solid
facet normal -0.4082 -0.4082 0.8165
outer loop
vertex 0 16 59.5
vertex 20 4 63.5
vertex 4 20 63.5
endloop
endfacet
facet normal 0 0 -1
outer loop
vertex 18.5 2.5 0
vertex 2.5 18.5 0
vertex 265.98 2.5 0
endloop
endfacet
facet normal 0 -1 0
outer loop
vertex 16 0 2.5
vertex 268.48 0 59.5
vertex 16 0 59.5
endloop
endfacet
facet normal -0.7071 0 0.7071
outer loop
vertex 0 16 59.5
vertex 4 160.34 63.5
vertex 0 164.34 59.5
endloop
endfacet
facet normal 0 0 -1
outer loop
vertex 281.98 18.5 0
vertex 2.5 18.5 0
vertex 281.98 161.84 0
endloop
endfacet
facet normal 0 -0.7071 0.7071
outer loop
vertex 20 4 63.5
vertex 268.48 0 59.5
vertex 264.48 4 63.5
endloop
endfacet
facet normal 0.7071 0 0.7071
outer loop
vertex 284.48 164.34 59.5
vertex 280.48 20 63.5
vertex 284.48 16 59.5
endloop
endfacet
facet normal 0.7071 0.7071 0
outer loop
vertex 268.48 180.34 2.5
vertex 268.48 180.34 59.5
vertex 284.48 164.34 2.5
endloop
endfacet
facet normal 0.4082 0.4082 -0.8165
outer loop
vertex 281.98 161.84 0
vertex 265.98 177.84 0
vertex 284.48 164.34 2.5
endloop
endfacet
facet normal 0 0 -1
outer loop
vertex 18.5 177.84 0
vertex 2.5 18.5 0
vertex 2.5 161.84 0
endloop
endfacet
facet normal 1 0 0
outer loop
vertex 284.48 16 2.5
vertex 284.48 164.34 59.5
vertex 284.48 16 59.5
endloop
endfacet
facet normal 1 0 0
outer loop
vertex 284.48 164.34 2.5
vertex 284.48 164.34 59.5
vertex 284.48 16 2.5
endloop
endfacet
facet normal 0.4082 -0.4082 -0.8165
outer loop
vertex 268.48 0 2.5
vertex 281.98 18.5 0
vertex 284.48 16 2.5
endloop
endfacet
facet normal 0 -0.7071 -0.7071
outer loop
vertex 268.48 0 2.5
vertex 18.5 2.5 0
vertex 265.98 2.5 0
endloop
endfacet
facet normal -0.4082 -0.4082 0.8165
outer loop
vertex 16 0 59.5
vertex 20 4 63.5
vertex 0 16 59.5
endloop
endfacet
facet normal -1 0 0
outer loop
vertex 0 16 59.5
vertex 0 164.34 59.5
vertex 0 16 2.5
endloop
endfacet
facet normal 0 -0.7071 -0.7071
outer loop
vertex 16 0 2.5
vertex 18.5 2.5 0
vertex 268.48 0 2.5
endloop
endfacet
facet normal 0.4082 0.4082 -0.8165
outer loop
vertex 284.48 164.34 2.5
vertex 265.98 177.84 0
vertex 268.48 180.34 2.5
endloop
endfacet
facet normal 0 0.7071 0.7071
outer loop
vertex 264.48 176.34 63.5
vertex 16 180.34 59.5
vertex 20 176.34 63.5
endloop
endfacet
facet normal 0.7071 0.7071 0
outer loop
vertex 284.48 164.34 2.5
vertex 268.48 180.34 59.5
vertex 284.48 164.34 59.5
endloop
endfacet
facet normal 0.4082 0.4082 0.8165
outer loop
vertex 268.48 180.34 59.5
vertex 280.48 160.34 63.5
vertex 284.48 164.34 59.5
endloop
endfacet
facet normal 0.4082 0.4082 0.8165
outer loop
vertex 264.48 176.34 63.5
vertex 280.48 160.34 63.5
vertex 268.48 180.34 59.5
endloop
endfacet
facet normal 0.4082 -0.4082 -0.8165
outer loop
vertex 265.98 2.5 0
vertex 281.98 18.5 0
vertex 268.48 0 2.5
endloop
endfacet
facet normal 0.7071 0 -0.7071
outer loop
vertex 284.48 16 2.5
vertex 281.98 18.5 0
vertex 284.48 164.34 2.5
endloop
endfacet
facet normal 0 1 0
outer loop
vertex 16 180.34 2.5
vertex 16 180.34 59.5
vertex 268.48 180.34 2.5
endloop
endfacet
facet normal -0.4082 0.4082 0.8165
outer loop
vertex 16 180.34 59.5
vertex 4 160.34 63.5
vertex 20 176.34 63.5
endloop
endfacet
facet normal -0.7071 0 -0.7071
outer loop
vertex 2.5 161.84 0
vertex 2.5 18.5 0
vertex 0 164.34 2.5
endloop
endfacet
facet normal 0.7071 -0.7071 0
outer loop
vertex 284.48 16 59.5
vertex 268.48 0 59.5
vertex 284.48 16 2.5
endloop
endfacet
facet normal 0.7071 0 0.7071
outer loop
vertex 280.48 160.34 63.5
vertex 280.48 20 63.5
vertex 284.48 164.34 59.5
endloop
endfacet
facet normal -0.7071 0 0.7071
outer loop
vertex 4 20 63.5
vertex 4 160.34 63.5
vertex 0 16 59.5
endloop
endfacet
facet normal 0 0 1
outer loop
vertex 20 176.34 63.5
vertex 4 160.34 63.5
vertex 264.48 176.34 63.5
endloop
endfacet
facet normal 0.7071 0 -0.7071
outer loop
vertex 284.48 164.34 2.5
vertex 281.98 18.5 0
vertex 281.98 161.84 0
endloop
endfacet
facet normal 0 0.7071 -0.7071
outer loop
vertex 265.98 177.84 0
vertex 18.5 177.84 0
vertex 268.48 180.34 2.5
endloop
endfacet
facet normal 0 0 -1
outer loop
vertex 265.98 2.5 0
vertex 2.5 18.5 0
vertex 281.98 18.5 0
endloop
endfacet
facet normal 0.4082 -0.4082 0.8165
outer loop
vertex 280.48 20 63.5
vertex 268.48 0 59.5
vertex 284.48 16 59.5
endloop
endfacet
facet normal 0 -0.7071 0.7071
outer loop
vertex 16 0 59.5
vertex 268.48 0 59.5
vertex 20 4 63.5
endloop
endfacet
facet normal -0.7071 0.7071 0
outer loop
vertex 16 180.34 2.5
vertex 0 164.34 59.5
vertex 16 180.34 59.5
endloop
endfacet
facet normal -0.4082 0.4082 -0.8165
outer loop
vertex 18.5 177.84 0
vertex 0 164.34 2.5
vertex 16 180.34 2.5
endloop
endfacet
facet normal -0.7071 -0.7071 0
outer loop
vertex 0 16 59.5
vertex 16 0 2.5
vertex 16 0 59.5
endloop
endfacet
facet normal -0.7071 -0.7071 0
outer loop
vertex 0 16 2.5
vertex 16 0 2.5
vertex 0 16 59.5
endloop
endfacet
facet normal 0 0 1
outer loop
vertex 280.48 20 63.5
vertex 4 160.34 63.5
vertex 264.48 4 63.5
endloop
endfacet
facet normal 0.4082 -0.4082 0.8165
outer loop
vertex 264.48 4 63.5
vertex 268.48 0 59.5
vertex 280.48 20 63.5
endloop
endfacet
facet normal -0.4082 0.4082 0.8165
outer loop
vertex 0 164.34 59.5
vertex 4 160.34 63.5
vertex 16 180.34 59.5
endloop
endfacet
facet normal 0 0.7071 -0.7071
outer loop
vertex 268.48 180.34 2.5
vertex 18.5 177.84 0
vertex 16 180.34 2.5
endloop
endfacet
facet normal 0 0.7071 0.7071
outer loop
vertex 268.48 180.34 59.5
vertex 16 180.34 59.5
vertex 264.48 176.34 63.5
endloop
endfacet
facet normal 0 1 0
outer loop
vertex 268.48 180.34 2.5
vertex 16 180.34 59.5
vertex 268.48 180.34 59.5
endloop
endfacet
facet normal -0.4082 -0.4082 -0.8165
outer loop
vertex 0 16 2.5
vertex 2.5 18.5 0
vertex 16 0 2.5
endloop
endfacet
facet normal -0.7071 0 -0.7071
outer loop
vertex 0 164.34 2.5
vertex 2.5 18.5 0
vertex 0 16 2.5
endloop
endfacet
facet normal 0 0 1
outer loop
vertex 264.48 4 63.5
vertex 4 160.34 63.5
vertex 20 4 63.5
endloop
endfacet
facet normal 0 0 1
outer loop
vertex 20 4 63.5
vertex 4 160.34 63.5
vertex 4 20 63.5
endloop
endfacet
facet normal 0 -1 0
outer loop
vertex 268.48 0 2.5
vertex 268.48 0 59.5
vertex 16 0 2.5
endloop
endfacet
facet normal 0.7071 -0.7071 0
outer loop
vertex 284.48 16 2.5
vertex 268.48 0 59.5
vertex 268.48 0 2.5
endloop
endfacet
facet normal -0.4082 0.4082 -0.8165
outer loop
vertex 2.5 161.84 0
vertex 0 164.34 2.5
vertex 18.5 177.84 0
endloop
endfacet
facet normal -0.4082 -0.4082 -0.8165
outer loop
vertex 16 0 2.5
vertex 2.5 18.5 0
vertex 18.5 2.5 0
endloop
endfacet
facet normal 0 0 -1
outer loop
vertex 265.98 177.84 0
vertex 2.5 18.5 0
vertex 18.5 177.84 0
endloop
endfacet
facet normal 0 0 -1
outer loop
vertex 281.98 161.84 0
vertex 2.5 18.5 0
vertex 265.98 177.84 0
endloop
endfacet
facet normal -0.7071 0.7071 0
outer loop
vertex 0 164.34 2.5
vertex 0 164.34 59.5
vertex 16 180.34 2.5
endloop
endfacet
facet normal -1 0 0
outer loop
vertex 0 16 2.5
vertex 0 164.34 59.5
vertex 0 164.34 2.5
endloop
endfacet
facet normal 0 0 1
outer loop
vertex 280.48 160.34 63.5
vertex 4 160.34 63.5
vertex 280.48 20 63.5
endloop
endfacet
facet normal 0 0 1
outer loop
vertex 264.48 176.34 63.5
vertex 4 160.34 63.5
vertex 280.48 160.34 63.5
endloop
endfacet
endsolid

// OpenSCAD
// ZACOS slab case — Tonverk-class, chamfered
// 11.2 x 7.1 x 2.5 in as given. All units mm. Edit the numbers; the shape follows.
// hollow=true gives an open-bottom printable shell for mockups.

L  = 11.2 * 25.4;   // length   284.48
W  = 7.1  * 25.4;   // width    180.34
H  = 2.5  * 25.4;   // height    63.50
CC = 16;            // plan corner chamfer — the brand shape
TB = 4;             // top edge bevel
BB = 2.5;           // bottom edge bevel

hollow = false;     // true -> shell with open bottom
wall   = 3;         // shell wall thickness when hollow

module plan(inset=0, cc=CC)
  polygon([
    [inset+cc, inset],       [L-inset-cc, inset],
    [L-inset,  inset+cc],    [L-inset,    W-inset-cc],
    [L-inset-cc, W-inset],   [inset+cc,   W-inset],
    [inset,    W-inset-cc],  [inset,      inset+cc]
  ]);

module slab(l=L, w=W, h=H)
  hull() {
    translate([0,0,BB]) linear_extrude(h-BB-TB) plan(0);
    translate([0,0,h-0.01]) linear_extrude(0.01) plan(TB);
    linear_extrude(0.01) plan(BB);
  }

if (hollow)
  difference() {
    slab();
    translate([0,0,-1]) linear_extrude(H-wall+1) plan(wall);
  }
else
  slab();

// the silhouette never changes.
